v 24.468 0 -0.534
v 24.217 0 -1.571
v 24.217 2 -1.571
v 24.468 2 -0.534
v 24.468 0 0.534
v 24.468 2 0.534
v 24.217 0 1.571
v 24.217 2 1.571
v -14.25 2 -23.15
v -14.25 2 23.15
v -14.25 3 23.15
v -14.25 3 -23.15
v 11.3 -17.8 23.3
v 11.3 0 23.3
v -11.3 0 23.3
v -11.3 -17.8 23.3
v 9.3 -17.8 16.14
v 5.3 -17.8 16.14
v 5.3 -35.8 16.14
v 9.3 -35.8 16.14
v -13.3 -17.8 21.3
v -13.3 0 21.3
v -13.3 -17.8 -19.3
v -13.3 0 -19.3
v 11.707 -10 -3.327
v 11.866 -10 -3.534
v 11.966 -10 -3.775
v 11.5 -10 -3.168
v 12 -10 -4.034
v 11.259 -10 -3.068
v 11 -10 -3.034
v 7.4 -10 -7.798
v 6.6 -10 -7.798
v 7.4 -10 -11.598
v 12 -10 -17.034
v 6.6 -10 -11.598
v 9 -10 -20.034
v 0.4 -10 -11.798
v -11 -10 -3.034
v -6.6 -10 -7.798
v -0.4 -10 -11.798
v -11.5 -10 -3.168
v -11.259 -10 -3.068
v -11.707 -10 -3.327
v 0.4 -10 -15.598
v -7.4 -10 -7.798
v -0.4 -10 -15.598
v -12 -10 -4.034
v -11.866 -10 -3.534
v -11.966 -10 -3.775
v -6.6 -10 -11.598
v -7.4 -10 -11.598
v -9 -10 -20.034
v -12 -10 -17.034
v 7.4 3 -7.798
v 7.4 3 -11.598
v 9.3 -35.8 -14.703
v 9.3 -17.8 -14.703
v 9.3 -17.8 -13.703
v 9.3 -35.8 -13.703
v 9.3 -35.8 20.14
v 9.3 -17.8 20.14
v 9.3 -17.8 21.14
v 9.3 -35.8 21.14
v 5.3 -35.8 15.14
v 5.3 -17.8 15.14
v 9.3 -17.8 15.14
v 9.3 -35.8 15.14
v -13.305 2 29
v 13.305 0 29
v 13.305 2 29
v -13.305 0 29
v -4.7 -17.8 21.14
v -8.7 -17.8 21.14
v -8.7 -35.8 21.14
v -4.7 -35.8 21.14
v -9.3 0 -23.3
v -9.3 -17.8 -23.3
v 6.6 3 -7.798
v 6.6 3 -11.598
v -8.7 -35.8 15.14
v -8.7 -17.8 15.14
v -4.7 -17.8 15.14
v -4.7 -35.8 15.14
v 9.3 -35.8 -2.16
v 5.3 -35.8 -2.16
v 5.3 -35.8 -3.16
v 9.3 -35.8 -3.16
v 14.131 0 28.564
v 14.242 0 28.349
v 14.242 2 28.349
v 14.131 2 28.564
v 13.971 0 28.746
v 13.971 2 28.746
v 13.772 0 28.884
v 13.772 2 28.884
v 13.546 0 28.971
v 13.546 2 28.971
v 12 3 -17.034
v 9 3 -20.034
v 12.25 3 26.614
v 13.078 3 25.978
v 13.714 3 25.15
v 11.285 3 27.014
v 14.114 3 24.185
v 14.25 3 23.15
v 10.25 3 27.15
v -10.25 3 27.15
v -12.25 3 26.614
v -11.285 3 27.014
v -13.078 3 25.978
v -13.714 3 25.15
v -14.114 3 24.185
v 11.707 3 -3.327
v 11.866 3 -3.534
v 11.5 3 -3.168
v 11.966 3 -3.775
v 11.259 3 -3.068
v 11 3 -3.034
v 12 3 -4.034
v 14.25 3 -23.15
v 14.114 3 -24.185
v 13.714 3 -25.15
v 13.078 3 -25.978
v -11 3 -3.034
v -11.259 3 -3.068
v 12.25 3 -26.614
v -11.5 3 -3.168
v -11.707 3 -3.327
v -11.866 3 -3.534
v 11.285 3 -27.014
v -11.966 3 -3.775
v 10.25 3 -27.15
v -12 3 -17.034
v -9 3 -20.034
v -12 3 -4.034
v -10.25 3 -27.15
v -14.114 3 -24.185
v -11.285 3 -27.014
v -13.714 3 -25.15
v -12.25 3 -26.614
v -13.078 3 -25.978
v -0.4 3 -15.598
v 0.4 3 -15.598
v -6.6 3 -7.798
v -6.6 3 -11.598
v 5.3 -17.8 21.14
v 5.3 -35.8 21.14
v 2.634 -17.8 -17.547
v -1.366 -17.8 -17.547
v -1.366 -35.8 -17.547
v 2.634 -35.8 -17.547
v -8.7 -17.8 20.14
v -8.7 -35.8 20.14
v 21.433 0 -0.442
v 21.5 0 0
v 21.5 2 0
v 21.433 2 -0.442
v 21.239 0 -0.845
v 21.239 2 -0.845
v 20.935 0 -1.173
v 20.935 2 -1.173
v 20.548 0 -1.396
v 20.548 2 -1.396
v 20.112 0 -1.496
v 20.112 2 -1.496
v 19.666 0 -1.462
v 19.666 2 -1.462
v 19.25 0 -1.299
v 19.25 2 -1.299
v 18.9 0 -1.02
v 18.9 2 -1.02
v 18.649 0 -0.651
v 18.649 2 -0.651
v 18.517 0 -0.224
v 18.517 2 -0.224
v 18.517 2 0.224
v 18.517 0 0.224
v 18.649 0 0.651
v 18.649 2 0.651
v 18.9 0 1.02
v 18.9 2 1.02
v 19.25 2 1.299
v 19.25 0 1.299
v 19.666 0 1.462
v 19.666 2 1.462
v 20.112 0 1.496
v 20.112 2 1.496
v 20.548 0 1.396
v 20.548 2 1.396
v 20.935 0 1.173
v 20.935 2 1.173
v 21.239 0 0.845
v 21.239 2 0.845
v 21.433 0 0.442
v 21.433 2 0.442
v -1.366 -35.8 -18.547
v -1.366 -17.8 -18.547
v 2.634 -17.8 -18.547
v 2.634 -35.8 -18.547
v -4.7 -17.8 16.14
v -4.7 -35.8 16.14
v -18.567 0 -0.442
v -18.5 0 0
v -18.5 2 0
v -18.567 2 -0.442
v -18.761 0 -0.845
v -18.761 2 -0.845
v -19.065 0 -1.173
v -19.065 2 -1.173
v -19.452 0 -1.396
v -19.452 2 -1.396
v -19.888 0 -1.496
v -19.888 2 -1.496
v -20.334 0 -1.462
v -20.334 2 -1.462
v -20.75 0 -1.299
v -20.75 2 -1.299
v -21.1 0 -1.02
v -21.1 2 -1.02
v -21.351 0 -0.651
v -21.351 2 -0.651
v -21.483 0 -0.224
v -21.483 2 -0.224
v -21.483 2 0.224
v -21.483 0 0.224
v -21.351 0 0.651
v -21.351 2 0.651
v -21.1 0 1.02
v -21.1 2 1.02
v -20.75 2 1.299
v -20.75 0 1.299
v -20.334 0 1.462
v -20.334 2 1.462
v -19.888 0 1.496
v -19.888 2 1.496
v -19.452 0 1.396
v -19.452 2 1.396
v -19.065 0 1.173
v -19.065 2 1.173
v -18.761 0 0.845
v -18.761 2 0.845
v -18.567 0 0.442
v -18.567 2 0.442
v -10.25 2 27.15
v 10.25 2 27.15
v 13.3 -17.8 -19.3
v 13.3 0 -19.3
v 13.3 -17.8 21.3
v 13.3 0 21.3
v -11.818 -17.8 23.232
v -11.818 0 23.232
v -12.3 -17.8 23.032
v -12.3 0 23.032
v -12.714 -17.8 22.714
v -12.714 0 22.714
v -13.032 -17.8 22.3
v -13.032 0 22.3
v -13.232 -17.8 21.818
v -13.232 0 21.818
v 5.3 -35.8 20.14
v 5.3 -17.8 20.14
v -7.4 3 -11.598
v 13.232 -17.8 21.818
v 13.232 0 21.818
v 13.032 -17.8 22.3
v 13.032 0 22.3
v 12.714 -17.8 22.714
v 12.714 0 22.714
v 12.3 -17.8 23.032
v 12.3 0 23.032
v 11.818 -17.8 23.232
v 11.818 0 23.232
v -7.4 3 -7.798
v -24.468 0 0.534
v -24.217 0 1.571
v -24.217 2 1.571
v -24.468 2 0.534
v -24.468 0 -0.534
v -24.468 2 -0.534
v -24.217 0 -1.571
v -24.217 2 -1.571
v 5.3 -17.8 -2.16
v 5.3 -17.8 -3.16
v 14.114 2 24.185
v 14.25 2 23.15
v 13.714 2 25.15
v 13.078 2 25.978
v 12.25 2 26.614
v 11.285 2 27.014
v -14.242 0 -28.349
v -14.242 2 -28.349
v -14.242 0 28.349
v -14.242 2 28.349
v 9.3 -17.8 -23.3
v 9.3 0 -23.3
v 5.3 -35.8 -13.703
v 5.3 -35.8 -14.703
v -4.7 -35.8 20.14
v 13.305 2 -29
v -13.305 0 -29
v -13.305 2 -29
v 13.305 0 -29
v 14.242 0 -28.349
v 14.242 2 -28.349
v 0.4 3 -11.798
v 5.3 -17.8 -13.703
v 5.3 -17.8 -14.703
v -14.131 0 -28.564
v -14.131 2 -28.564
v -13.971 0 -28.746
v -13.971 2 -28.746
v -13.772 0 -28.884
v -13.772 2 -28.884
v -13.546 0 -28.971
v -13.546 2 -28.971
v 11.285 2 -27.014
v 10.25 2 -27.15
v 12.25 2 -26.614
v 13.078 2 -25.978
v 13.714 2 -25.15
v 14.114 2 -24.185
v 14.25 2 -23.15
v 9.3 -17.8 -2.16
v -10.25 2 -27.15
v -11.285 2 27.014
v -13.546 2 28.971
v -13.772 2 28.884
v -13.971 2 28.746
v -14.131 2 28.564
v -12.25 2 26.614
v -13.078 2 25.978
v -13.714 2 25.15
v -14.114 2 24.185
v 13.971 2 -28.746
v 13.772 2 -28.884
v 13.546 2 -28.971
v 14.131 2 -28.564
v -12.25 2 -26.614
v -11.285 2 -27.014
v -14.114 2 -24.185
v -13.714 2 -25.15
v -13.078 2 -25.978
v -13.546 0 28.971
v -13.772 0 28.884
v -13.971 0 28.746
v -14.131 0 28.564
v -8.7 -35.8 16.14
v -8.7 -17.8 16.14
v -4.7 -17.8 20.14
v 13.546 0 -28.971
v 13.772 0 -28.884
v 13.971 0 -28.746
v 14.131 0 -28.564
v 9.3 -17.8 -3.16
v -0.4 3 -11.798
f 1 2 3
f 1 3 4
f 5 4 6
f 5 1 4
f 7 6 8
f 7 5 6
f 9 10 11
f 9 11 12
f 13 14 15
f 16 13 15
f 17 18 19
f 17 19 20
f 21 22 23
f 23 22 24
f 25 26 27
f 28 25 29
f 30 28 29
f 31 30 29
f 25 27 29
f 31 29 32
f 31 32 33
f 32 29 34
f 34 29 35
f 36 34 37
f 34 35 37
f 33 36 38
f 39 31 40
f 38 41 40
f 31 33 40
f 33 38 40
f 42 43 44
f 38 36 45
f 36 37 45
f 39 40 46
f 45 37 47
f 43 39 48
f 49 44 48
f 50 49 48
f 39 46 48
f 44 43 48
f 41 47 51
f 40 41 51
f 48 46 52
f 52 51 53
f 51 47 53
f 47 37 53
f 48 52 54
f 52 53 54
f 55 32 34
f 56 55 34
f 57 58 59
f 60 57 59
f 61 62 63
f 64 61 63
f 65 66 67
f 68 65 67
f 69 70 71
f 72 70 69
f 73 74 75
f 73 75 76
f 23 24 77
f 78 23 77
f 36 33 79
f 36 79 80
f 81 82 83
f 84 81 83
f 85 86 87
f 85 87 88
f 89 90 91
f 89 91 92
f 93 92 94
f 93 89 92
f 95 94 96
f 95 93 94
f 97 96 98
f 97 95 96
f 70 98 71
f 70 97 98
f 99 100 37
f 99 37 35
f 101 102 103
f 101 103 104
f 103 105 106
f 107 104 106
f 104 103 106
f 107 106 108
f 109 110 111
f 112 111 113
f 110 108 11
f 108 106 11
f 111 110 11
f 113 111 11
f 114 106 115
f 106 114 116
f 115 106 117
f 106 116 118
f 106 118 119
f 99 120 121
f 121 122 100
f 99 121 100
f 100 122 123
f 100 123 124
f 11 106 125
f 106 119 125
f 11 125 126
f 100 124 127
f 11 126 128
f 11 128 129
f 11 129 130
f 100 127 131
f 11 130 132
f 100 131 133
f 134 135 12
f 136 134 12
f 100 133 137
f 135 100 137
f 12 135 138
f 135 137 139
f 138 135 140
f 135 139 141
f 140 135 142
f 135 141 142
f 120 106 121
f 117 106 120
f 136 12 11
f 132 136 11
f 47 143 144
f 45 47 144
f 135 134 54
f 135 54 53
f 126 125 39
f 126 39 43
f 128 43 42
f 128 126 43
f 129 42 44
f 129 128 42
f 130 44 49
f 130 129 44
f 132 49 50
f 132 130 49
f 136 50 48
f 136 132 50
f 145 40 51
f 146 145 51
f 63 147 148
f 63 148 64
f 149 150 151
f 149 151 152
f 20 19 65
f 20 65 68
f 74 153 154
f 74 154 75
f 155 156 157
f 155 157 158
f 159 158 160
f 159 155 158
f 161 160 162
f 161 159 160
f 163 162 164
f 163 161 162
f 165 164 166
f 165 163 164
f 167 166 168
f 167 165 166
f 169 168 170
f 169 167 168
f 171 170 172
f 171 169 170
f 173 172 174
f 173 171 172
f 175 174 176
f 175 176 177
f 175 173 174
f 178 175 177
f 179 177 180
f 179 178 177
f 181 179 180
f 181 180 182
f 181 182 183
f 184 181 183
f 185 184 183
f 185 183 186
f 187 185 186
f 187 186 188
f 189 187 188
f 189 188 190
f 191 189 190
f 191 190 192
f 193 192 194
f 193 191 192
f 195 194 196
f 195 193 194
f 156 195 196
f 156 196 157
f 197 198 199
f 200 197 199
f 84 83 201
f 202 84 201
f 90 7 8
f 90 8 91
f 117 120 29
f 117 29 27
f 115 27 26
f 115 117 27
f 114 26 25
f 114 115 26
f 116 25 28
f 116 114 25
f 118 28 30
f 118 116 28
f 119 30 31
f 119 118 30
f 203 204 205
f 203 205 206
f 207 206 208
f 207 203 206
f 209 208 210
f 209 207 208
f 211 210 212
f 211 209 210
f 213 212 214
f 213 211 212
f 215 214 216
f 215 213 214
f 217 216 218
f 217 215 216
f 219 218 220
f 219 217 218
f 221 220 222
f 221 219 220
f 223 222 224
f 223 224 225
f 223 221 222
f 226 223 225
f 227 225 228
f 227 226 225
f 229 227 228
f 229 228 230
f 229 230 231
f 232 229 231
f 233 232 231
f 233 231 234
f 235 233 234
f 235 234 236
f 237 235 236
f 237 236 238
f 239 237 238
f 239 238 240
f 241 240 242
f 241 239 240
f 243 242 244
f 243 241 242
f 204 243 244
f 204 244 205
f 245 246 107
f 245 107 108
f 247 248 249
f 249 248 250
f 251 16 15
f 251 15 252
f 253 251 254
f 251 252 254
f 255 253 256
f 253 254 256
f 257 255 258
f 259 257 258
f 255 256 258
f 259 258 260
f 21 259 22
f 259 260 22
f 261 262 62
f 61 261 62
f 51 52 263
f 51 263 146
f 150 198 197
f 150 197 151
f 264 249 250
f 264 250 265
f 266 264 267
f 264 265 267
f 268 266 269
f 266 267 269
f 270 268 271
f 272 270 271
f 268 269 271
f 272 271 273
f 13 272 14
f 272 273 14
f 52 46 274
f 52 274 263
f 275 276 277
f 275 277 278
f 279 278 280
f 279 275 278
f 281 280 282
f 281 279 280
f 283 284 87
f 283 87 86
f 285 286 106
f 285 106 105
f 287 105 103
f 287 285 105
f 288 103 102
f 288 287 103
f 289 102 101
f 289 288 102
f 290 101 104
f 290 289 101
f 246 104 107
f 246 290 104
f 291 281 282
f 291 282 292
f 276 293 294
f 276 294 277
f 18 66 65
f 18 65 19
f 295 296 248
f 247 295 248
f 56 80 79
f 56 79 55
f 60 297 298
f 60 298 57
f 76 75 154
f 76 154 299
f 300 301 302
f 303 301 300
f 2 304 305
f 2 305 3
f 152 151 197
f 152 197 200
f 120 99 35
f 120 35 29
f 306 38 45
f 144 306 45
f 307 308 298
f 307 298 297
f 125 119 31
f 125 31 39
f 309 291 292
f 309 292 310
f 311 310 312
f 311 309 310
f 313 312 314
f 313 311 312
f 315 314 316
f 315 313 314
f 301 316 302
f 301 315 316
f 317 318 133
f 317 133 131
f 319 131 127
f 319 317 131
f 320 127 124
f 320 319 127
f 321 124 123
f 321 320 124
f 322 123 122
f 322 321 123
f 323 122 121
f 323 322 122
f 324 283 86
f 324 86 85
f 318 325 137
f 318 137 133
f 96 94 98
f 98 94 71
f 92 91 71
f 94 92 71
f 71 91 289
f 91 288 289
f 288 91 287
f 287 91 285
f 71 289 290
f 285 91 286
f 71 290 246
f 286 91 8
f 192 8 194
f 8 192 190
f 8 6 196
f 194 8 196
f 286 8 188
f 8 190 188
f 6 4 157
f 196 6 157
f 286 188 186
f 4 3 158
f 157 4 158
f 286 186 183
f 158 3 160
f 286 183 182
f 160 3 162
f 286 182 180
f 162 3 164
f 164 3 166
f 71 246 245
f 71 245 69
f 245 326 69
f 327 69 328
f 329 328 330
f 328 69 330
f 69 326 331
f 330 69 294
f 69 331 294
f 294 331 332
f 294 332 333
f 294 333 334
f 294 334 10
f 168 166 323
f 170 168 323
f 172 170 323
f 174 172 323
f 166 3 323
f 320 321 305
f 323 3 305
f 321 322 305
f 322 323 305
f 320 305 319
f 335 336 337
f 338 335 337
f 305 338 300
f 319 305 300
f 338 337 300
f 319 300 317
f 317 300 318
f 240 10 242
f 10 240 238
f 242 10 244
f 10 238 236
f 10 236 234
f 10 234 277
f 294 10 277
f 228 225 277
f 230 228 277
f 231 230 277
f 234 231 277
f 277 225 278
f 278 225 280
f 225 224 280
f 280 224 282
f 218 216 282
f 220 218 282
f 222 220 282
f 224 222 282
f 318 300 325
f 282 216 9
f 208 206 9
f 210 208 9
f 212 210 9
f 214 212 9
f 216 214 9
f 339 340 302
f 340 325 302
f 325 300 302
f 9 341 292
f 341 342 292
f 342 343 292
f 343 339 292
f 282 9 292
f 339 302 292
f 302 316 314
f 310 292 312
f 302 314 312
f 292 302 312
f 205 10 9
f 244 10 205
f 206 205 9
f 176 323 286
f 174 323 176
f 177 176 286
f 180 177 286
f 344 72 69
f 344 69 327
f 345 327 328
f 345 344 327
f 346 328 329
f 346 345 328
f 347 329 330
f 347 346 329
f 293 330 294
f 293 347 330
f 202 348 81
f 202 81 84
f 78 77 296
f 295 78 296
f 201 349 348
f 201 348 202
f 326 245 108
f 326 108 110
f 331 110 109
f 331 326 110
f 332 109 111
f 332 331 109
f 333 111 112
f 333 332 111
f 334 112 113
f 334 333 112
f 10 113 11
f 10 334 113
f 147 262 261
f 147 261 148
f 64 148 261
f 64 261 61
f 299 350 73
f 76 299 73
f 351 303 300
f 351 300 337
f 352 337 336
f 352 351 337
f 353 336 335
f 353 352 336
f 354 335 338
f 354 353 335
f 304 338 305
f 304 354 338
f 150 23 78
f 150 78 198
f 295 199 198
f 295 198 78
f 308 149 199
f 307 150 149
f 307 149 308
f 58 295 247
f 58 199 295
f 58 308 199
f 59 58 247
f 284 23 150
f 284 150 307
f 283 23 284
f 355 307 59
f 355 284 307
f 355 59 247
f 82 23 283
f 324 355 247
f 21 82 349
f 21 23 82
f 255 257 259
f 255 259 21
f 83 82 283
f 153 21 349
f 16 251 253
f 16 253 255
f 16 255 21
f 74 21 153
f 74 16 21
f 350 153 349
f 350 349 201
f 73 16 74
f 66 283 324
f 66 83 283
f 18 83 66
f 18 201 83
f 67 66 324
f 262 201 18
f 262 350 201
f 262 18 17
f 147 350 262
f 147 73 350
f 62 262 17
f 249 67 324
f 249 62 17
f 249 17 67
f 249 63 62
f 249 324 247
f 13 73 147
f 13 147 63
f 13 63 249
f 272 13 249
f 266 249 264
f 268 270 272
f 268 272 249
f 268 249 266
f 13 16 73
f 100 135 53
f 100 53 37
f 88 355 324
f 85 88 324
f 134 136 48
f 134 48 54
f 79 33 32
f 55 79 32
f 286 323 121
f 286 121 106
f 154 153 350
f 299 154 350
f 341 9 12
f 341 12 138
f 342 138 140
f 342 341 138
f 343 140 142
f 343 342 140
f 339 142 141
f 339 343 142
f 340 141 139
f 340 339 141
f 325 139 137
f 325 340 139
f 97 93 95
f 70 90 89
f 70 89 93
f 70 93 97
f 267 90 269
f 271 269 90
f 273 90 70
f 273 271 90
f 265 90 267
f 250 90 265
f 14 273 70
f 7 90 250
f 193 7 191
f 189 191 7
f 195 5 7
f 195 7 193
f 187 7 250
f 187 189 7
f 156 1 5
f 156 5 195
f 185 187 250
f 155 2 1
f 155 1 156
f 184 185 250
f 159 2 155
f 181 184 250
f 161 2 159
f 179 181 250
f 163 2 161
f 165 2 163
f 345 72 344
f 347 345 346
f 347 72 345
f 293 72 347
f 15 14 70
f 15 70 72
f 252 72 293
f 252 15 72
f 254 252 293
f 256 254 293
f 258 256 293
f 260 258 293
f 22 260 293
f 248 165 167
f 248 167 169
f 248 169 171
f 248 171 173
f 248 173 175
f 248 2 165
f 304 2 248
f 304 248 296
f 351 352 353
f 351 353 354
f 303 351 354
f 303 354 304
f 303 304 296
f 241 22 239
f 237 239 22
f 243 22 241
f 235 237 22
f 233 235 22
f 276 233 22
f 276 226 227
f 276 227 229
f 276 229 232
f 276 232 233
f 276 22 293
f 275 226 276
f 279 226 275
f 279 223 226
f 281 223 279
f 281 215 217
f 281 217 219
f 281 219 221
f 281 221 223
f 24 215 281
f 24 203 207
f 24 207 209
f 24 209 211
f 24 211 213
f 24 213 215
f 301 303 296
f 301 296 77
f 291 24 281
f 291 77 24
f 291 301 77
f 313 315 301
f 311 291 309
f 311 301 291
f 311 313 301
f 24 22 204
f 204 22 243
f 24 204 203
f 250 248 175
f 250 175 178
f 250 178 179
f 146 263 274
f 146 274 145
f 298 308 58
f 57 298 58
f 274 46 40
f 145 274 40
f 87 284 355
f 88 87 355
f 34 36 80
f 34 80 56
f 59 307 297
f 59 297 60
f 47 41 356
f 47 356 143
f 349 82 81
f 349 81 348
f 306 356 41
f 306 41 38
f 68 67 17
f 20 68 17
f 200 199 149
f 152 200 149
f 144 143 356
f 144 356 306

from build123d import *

# Parameters (mm, degrees)
SKETCH_1_R          = 1.5
EXTRUDE_1_DEPTH     = 2
EXTRUDE_2_DEPTH     = 17.8
EXTRUDE_3_DEPTH     = 1
CUT_EXTRUDE_START   = 1
CUT_EXTRUDE_1_DEPTH = 13
SKETCH_5_W          = 0.8
SKETCH_5_H          = 3.8
EXTRUDE_4_DEPTH     = 13
SKETCH_6_W          = 4
SKETCH_6_H          = 1
EXTRUDE_5_DEPTH     = 18


with BuildPart() as part:
    # 草图1 → 凸台-拉伸1 (new body)
    with BuildSketch(Plane(origin=(0, 0, 0), x_dir=(1, 0, 0), z_dir=(0, 1, 0))):
        with BuildLine():
            Line((-24.216959088, 1.570750156), (-14.242466434, 28.34905559))
            ThreePointArc((-14.242466434, 28.34905559), (-13.875866128, 28.821296411), (-13.305364415, 29))
            Line((-13.305364415, 29), (13.305364415, 29))
            ThreePointArc((13.305364415, 29), (13.875866128, 28.821296411), (14.242466434, 28.34905559))
            Line((14.242466434, 28.34905559), (24.216959088, 1.570750156))
            ThreePointArc((24.216959088, 1.570750156), (24.5, 0), (24.216959088, -1.570750156))
            Line((24.216959088, -1.570750156), (14.242466434, -28.34905559))
            ThreePointArc((14.242466434, -28.34905559), (13.875866128, -28.821296411), (13.305364415, -29))
            Line((13.305364415, -29), (-13.305364415, -29))
            ThreePointArc((-13.305364415, -29), (-13.875866128, -28.821296411), (-14.242466434, -28.34905559))
            Line((-14.242466434, -28.34905559), (-24.216959088, -1.570750156))
            ThreePointArc((-24.216959088, -1.570750156), (-24.5, 0), (-24.216959088, 1.570750156))
        make_face()
        with Locations((-20, 0)):
            Circle(SKETCH_1_R, mode=Mode.SUBTRACT)
        with Locations((20, 0)):
            Circle(SKETCH_1_R, mode=Mode.SUBTRACT)
    extrude(amount=EXTRUDE_1_DEPTH)

    # 草图2 → 凸台-拉伸2 (add)
    with BuildSketch(Plane.XZ):
        with BuildLine():
            Line((-13.3, -19.3), (-9.3, -23.3))
            Line((-9.3, -23.3), (9.3, -23.3))
            Line((9.3, -23.3), (13.3, -19.3))
            Line((13.3, -19.3), (13.3, 21.3))
            ThreePointArc((13.3, 21.3), (12.714213562, 22.714213562), (11.3, 23.3))
            Line((11.3, 23.3), (-11.3, 23.3))
            ThreePointArc((-11.3, 23.3), (-12.714213562, 22.714213562), (-13.3, 21.3))
            Line((-13.3, 21.3), (-13.3, -19.3))
        make_face()
    extrude(amount=EXTRUDE_2_DEPTH)

    # 草图4 → 凸台-拉伸3 (add)
    with BuildSketch(Plane(origin=(0, 2, 0), x_dir=(1, 0, 0), z_dir=(0, 1, 0))):
        with BuildLine():
            Line((-10.25, 27.15), (10.25, 27.15))
            ThreePointArc((10.25, 27.15), (13.078427125, 25.978427125), (14.25, 23.15))
            Line((14.25, 23.15), (14.25, -23.15))
            ThreePointArc((14.25, -23.15), (13.078427125, -25.978427125), (10.25, -27.15))
            Line((10.25, -27.15), (-10.25, -27.15))
            ThreePointArc((-10.25, -27.15), (-13.078427125, -25.978427125), (-14.25, -23.15))
            Line((-14.25, -23.15), (-14.25, 23.15))
            ThreePointArc((-14.25, 23.15), (-13.078427125, 25.978427125), (-10.25, 27.15))
        make_face()
    extrude(amount=EXTRUDE_3_DEPTH)

    # 草图3 → 切除-拉伸1 (cut)
    with BuildSketch(Plane(origin=(0, 2, 0), x_dir=(1, 0, 0), z_dir=(0, 1, 0)).offset(CUT_EXTRUDE_START)):
        with BuildLine():
            Line((-9, 20.034278181), (9, 20.034278181))
            Line((9, 20.034278181), (12, 17.034278181))
            Line((12, 17.034278181), (12, 4.034278181))
            ThreePointArc((12, 4.034278181), (11.707106781, 3.327171399), (11, 3.034278181))
            Line((11, 3.034278181), (-11, 3.034278181))
            ThreePointArc((-11, 3.034278181), (-11.707106781, 3.327171399), (-12, 4.034278181))
            Line((-12, 4.034278181), (-12, 17.034278181))
            Line((-12, 17.034278181), (-9, 20.034278181))
        make_face()
    extrude(amount=-CUT_EXTRUDE_1_DEPTH, mode=Mode.SUBTRACT)

    # 草图5 → 凸台-拉伸4 (add)
    with BuildSketch(Plane(origin=(0, -10, 0), x_dir=(1, 0, 0), z_dir=(0, 1, 0))):
        with Locations((-7, 9.698034266)):
            Rectangle(SKETCH_5_W, SKETCH_5_H)
        with Locations((0, 13.698034266)):
            Rectangle(SKETCH_5_W, SKETCH_5_H)
        with Locations((7, 9.698034266)):
            Rectangle(SKETCH_5_W, SKETCH_5_H)
    extrude(amount=EXTRUDE_4_DEPTH)

    # 草图6 → 凸台-拉伸5 (add)
    with BuildSketch(Plane.XZ.offset(17.8)):
        with Locations((7.3, 20.63986364)):
            Rectangle(SKETCH_6_W, SKETCH_6_H)
        with Locations((-6.7, 20.63986364)):
            Rectangle(SKETCH_6_W, SKETCH_6_H)
        with Locations((7.3, 15.63986364)):
            Rectangle(SKETCH_6_W, SKETCH_6_H)
        with Locations((-6.7, 15.63986364)):
            Rectangle(SKETCH_6_W, SKETCH_6_H)
        with Locations((7.3, -2.659527469)):
            Rectangle(SKETCH_6_W, SKETCH_6_H)
        with Locations((7.3, -14.202737865)):
            Rectangle(SKETCH_6_W, SKETCH_6_H)
        with Locations((0.634367625, -18.047402207)):
            Rectangle(SKETCH_6_W, SKETCH_6_H)
    extrude(amount=EXTRUDE_5_DEPTH)


solid = part.part
